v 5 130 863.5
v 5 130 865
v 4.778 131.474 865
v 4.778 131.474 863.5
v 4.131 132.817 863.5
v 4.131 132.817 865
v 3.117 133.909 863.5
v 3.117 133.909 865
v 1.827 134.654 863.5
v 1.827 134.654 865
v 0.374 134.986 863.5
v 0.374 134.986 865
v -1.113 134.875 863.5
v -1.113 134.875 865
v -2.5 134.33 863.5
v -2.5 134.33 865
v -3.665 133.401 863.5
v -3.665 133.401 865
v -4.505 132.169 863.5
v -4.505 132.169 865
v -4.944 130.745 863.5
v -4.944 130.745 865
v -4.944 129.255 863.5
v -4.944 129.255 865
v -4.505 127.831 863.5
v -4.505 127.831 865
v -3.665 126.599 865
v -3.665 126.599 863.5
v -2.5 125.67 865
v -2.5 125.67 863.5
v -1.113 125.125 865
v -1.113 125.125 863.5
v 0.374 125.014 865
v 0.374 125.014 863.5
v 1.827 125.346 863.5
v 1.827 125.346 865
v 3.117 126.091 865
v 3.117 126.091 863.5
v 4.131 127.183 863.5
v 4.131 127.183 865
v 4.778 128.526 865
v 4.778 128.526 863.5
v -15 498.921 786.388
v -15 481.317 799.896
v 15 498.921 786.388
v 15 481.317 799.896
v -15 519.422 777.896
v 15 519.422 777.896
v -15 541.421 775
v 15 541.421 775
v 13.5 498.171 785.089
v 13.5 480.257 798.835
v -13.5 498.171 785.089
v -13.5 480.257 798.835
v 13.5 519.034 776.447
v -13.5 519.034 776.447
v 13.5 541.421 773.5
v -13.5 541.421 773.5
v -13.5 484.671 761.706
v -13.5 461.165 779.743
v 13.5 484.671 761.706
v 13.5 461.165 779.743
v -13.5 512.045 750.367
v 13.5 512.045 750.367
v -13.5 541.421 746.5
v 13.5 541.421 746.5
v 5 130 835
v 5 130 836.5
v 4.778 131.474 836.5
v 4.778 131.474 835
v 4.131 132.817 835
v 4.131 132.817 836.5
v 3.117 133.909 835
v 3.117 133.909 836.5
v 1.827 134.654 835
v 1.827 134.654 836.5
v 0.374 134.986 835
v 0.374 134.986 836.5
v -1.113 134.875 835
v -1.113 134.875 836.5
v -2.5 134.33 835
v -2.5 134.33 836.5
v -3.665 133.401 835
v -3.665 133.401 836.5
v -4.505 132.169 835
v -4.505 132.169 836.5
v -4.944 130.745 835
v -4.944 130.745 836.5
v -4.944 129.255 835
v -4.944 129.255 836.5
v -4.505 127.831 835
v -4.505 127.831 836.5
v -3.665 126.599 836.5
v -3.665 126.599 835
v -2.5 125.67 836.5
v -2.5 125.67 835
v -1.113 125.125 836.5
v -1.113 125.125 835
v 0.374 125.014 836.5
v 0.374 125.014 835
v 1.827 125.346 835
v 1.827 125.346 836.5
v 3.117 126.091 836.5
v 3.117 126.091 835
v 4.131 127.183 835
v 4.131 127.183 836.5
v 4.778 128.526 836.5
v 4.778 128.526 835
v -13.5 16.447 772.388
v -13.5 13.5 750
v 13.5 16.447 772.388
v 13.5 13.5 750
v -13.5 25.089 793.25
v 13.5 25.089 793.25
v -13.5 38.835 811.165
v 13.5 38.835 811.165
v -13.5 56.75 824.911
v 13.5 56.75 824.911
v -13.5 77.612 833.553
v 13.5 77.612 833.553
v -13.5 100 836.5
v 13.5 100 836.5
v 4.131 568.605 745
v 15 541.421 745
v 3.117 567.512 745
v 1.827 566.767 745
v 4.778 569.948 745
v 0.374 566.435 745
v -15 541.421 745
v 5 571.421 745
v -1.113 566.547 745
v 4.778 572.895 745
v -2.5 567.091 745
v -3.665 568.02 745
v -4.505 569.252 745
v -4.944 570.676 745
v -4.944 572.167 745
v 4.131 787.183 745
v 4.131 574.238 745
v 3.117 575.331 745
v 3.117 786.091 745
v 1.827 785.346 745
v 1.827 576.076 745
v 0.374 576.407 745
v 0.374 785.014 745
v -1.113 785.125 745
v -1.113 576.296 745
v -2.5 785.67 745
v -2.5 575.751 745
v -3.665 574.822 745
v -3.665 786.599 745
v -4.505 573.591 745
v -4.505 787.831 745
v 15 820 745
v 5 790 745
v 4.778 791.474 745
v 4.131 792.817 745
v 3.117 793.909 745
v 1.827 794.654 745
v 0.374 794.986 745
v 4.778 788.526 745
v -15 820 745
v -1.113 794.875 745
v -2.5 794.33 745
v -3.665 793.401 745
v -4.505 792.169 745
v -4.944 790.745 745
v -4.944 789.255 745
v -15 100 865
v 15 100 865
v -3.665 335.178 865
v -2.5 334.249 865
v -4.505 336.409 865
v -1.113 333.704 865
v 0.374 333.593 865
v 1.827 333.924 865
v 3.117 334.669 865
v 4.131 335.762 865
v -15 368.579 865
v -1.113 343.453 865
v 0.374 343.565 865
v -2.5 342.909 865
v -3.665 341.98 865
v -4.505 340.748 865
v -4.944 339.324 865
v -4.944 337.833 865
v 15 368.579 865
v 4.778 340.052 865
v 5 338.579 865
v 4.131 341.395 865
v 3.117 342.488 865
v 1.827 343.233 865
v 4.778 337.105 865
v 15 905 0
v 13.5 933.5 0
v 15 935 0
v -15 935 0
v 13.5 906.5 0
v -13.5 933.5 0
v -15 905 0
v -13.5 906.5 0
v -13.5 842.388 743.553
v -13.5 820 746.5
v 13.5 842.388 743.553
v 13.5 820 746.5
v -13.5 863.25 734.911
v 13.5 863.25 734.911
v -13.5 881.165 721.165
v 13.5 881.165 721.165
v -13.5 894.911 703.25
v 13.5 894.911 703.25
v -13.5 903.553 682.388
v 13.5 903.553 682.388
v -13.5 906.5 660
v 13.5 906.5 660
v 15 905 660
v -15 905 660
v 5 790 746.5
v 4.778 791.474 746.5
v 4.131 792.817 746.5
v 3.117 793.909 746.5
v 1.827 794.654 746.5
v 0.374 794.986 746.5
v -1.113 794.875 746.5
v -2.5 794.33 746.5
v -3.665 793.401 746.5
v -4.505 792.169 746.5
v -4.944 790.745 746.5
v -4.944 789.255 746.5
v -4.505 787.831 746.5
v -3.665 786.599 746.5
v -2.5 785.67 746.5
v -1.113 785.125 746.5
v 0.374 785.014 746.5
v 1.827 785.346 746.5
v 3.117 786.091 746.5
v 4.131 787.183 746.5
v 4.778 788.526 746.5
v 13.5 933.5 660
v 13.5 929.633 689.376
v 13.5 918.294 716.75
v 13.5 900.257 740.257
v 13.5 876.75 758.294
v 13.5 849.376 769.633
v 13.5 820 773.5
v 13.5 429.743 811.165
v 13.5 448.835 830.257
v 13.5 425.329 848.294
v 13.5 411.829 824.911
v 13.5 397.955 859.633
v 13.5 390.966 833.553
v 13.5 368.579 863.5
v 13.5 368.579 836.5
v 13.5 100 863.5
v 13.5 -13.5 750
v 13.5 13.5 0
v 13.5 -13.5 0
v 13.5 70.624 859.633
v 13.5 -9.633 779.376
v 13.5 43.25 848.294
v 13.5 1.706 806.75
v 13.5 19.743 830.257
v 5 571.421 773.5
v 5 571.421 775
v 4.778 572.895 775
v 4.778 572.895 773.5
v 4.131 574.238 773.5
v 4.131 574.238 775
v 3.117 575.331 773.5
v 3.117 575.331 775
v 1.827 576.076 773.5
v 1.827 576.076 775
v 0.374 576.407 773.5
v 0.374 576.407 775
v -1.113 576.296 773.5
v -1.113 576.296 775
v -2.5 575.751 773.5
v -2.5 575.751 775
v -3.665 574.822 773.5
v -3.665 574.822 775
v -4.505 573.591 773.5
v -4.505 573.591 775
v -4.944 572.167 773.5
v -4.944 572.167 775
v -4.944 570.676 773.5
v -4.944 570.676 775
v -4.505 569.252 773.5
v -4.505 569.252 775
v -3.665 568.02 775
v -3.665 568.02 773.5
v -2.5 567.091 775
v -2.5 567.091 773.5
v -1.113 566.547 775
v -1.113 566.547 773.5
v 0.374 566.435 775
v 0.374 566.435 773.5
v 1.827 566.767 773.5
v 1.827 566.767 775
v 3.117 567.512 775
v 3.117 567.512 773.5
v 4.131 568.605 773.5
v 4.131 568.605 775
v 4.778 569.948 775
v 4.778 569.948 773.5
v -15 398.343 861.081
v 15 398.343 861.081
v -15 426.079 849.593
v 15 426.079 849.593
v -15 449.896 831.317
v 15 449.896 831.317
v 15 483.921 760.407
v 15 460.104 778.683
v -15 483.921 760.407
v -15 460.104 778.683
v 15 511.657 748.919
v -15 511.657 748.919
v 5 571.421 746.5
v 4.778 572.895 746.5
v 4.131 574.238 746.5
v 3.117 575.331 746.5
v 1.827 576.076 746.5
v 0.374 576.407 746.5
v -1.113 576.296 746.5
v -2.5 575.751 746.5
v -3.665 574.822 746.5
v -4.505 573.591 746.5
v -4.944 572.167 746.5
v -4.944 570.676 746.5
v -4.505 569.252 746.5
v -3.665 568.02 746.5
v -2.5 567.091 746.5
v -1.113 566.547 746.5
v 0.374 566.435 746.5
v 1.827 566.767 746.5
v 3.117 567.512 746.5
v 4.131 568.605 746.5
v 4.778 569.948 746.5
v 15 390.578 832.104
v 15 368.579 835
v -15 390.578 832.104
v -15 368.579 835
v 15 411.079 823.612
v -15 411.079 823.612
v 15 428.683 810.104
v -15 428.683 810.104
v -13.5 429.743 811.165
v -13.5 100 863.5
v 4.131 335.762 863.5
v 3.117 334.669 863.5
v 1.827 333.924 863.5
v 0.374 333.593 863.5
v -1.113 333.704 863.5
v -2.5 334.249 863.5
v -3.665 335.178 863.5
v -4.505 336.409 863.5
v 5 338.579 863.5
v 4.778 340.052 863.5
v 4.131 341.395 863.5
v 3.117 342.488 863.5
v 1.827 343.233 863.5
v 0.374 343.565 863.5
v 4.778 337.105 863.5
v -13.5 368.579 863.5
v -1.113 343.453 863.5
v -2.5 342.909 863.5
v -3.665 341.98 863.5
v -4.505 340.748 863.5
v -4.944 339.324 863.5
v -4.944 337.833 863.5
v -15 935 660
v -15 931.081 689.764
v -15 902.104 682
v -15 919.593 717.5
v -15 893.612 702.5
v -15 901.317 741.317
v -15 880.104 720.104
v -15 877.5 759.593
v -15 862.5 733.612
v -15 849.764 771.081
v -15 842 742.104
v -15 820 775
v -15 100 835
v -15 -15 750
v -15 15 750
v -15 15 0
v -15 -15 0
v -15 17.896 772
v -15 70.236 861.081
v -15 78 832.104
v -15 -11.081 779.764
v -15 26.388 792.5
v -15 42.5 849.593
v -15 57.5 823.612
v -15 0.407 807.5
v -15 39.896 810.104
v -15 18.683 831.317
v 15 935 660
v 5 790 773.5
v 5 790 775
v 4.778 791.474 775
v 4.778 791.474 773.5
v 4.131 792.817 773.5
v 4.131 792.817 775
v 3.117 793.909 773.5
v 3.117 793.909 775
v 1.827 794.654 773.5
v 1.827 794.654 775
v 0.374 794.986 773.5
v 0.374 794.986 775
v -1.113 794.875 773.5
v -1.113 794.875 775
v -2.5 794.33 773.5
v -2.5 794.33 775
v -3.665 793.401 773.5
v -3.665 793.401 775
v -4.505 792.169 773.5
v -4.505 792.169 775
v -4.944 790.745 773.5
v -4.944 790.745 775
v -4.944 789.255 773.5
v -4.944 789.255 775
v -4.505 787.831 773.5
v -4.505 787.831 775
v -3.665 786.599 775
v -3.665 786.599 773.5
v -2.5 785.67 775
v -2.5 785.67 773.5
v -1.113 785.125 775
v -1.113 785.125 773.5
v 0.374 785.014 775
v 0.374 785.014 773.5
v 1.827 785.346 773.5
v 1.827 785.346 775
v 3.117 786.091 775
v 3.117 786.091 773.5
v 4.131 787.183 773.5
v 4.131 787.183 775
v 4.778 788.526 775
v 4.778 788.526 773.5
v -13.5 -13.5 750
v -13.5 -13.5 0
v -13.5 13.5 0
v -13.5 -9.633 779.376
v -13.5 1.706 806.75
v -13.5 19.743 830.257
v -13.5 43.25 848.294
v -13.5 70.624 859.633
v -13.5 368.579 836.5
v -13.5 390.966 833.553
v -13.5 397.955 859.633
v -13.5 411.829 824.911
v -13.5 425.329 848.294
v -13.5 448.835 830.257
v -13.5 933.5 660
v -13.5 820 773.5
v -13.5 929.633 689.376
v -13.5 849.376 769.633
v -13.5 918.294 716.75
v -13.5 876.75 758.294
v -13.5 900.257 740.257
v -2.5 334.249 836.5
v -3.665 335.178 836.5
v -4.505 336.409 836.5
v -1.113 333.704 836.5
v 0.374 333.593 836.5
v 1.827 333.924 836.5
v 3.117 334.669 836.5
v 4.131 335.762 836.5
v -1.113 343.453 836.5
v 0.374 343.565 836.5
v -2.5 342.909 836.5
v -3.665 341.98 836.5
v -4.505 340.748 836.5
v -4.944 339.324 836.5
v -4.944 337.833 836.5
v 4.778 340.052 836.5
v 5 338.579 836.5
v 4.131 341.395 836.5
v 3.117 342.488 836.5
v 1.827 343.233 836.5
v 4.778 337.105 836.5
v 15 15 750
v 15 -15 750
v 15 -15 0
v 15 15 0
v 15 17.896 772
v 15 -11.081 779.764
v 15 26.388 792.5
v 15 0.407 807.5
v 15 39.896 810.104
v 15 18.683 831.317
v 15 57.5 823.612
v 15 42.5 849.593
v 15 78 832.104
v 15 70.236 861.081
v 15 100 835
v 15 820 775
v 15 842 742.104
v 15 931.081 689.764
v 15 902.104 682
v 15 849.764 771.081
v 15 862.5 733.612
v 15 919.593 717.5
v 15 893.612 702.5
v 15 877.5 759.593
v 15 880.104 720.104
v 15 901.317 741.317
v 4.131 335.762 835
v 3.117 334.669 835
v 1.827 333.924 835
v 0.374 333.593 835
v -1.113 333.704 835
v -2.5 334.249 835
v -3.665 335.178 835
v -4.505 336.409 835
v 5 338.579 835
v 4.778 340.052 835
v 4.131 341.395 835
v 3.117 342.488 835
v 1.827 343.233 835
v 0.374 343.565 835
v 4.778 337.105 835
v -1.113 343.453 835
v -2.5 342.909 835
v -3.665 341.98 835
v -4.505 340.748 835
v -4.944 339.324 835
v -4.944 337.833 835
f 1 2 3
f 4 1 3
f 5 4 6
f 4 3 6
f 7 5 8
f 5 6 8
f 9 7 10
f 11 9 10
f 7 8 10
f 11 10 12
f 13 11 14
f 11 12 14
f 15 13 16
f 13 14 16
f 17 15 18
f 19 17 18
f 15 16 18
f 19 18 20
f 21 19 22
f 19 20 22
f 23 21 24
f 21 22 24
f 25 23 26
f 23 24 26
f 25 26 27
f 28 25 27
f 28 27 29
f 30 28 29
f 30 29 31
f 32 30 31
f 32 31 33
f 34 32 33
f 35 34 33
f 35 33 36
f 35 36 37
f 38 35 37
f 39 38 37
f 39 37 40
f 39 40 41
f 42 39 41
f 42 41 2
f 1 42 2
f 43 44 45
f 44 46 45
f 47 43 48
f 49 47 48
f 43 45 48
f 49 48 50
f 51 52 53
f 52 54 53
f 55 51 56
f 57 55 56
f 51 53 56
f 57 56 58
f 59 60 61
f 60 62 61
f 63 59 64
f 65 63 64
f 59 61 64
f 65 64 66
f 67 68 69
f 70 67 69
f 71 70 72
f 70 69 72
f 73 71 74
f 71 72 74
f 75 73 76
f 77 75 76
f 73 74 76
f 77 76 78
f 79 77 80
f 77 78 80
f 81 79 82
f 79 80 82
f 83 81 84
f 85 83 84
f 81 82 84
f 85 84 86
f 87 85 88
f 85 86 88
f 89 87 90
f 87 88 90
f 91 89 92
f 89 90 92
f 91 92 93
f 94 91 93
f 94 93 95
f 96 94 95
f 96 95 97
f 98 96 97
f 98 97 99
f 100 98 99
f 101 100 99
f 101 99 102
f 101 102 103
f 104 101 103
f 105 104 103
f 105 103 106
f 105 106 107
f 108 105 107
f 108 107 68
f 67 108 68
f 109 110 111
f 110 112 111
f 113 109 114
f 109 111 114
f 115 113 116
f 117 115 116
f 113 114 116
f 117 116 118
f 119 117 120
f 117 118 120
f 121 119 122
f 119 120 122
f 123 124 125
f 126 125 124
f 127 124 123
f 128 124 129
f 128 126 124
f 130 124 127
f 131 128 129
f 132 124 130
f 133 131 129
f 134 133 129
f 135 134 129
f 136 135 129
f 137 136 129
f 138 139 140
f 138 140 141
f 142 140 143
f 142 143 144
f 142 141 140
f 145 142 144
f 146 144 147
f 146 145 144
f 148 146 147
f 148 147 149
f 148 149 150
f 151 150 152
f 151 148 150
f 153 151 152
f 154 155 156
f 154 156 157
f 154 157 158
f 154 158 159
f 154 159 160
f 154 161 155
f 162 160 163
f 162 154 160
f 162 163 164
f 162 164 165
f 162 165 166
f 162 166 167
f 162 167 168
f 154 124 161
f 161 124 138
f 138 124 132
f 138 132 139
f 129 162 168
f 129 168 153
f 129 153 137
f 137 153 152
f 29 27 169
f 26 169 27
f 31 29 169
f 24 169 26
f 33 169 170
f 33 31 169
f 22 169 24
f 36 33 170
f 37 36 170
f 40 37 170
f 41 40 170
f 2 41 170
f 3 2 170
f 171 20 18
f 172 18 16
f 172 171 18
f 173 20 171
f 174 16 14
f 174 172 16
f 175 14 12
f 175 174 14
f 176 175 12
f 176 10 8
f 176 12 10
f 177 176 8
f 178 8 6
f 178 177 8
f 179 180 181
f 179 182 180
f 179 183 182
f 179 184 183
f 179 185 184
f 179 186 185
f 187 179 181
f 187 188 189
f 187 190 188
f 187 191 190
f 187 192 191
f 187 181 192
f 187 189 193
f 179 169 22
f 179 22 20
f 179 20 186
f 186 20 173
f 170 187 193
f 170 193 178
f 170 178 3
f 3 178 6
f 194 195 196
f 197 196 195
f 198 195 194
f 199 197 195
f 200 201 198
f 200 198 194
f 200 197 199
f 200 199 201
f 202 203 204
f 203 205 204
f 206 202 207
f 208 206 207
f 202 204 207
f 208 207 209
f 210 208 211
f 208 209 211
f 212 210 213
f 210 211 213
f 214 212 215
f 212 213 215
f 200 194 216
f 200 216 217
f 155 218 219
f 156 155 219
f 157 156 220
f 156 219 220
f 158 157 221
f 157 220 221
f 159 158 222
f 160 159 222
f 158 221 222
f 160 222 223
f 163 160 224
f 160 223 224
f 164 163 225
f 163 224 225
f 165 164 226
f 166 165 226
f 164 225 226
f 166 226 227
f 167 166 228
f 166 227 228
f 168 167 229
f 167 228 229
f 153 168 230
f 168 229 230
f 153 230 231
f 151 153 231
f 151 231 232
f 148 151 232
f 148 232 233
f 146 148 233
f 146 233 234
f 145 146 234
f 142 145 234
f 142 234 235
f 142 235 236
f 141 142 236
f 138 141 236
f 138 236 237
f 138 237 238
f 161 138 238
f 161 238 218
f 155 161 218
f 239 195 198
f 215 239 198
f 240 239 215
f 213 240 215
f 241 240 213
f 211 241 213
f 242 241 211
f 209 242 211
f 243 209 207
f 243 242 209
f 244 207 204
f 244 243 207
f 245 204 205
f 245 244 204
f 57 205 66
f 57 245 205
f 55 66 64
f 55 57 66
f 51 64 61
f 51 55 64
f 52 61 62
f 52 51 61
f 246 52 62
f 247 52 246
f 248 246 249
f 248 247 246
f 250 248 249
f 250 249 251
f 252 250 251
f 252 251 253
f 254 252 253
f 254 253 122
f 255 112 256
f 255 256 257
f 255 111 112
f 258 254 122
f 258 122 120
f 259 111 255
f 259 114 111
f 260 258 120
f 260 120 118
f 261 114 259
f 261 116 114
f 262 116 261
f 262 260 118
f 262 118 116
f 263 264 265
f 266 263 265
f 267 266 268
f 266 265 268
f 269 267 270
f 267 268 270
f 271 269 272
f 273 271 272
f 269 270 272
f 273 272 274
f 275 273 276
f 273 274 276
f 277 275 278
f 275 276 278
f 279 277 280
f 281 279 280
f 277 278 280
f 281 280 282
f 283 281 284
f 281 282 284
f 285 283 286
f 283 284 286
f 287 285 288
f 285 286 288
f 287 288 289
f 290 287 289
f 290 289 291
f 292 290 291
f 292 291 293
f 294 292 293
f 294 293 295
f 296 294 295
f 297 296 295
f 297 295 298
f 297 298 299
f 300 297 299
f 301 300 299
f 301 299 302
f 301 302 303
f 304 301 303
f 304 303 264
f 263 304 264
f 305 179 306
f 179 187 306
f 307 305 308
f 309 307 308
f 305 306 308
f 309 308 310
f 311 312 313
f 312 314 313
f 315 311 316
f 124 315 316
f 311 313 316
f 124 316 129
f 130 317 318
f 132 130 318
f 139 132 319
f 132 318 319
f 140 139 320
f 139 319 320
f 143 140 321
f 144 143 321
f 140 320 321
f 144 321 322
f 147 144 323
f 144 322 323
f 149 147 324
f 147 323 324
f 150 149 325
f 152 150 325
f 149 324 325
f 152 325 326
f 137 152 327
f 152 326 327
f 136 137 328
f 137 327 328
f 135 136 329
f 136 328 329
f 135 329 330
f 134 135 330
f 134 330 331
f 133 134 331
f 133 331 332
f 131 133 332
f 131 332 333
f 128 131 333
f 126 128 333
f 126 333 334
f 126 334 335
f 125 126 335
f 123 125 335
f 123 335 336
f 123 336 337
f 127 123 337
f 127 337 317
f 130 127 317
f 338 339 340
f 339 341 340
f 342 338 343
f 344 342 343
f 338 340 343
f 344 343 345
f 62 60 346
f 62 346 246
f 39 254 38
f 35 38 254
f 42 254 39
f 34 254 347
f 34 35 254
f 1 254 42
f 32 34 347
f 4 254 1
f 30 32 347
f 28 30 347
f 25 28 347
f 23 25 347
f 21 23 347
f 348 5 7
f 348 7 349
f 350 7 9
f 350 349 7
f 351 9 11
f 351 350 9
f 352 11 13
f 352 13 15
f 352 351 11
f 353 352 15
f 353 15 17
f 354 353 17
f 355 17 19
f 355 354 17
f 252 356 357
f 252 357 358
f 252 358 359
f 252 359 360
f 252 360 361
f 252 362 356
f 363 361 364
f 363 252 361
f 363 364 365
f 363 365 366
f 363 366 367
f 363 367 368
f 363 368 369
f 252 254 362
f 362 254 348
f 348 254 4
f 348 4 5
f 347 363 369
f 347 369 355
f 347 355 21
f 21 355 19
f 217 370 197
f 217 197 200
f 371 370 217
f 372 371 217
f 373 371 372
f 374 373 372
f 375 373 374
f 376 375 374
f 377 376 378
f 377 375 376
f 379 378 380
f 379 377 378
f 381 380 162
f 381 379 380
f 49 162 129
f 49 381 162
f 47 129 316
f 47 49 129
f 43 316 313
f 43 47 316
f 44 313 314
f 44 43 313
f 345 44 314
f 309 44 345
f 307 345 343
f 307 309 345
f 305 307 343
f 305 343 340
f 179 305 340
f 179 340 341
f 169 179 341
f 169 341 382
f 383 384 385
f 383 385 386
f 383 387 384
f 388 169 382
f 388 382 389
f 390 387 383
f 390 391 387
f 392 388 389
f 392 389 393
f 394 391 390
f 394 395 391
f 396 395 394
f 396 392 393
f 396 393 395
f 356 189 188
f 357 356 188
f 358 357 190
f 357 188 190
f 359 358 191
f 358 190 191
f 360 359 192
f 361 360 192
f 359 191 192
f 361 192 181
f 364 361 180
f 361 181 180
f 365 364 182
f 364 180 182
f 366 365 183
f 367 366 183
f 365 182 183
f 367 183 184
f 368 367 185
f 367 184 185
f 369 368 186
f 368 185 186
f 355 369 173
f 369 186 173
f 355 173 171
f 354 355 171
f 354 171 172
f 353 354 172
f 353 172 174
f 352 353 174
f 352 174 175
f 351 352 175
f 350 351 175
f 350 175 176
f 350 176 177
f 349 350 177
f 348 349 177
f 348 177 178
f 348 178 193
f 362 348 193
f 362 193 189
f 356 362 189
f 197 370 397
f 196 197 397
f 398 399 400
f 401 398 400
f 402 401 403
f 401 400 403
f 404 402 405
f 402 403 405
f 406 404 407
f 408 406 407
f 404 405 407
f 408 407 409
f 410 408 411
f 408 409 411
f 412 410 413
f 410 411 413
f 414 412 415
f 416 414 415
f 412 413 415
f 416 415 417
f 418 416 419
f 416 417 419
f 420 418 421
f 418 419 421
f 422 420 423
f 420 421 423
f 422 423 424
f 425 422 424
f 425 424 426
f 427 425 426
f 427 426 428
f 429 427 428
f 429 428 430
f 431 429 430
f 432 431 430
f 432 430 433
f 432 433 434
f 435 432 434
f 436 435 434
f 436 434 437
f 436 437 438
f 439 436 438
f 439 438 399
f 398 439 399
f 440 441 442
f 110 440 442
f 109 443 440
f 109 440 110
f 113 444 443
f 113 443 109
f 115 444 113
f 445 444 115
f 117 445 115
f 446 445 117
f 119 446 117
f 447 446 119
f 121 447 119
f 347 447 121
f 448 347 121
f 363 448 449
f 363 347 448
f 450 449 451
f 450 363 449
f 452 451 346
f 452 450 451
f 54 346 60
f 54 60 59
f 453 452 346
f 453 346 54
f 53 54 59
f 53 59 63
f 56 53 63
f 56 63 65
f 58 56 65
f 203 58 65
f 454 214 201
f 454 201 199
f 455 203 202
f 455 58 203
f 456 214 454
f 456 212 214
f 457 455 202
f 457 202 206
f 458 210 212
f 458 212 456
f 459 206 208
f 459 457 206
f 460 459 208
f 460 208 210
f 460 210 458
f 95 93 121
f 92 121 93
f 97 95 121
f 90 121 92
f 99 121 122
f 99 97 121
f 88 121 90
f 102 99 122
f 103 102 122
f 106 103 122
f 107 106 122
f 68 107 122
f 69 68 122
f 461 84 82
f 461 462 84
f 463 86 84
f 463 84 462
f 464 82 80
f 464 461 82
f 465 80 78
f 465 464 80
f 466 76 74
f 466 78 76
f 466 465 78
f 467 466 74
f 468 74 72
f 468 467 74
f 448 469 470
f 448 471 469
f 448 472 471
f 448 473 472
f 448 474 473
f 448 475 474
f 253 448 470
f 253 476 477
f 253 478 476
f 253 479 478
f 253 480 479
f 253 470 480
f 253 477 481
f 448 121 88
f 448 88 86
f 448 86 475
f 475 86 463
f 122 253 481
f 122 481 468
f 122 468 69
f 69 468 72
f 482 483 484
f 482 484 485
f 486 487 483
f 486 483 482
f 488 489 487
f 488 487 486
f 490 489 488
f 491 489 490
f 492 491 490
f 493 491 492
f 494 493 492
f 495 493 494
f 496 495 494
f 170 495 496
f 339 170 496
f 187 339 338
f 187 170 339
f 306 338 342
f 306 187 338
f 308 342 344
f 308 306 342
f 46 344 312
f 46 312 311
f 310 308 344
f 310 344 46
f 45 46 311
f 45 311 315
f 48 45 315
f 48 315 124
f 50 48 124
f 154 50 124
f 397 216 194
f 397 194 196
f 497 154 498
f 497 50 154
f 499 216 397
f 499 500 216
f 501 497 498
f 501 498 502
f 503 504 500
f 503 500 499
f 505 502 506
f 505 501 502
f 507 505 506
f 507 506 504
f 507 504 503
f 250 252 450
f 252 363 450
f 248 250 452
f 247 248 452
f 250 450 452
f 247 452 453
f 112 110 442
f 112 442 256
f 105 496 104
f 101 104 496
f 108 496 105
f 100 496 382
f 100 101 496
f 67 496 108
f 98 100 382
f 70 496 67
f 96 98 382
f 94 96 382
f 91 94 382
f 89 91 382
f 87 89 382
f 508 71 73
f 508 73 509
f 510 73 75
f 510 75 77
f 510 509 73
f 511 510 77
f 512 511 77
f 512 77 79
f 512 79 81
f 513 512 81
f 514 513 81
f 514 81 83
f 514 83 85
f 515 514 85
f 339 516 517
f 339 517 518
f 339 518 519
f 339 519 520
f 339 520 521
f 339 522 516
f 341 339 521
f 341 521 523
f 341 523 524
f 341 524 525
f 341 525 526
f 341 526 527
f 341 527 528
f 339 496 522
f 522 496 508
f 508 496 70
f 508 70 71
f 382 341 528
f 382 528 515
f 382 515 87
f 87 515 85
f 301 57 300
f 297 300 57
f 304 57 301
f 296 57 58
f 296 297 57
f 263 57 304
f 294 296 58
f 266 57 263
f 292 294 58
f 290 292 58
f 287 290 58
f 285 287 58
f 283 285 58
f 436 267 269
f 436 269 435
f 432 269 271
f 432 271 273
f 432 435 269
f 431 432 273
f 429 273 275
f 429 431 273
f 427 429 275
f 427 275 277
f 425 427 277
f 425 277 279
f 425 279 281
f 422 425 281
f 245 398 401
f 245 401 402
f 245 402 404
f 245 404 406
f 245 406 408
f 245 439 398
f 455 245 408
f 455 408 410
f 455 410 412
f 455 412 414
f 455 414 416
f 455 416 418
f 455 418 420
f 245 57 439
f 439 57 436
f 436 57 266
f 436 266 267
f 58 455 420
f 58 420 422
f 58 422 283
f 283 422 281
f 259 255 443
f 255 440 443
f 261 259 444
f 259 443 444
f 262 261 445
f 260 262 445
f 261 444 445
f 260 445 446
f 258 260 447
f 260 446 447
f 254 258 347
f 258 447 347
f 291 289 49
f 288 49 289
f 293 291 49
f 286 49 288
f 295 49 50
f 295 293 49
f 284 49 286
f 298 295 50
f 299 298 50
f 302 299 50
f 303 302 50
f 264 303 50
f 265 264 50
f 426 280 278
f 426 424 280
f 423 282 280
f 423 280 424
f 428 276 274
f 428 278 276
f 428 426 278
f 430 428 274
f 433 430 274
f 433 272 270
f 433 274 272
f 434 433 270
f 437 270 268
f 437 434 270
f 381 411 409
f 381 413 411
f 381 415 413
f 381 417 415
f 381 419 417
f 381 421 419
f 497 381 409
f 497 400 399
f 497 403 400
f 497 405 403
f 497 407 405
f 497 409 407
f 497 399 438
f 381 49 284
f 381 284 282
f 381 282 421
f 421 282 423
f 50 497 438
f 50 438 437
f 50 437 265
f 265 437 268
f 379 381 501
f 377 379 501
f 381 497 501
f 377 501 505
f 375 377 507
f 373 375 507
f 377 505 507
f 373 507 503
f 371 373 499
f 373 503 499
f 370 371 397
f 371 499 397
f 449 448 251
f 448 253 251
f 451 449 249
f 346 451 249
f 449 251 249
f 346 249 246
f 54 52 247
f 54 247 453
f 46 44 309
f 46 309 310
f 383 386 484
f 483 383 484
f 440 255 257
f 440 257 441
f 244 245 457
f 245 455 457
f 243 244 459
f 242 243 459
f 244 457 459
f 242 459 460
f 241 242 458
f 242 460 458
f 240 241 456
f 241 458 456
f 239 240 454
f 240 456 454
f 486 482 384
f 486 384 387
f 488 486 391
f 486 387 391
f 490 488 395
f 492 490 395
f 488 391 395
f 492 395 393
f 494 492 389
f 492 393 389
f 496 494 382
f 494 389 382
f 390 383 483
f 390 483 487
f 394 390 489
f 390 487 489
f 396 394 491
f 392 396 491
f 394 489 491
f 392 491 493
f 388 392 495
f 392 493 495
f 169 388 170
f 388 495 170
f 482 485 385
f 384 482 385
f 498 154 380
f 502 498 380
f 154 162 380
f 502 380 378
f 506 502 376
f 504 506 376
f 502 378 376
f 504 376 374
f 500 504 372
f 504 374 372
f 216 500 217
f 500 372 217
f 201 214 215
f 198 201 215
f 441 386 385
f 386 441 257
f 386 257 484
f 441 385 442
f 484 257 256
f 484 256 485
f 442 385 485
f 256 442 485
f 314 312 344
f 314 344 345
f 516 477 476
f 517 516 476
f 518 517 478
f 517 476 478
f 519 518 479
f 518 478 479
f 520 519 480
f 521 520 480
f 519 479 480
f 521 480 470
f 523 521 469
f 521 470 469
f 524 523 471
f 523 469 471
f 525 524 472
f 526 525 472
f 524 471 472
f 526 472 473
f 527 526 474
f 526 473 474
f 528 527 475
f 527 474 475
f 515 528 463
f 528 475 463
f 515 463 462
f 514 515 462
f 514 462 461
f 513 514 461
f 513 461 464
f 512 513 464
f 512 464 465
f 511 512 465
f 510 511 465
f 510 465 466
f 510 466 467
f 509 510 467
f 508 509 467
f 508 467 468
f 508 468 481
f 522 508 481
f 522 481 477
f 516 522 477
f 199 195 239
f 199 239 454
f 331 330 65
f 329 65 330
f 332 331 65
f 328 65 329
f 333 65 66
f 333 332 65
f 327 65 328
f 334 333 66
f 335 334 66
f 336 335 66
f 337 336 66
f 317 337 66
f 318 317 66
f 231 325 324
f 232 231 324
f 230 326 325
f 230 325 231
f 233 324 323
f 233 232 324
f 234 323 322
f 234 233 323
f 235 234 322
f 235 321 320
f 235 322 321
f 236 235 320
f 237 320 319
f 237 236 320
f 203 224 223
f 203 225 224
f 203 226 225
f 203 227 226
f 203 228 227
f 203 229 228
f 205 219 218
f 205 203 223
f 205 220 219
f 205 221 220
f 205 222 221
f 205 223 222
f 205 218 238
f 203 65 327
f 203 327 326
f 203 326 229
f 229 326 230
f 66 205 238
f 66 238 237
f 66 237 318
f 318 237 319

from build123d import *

# Parameters (mm, degrees)
F1_W     = 30
F1_H     = 30
F1_W_2   = 27
F1_H_2   = 27
F3_R     = 5
F5_DEPTH = 40
F4_R     = 5
F6_DEPTH = 40


with BuildPart() as f2:
    # F2: sweep along a path in F0
    with BuildLine(Plane.YZ) as f2_path:
        Line((0, 0), (0, 750))
        ThreePointArc((0, 750), (29.2893218813, 820.7106781187), (100, 850))
        Line((100, 850), (368.5786437627, 850))
        ThreePointArc((368.5786437627, 850), (406.8469869992, 842.3879532511), (439.2893218813, 820.7106781187))
        Line((439.2893218813, 820.7106781187), (470.7106781187, 789.2893218813))
        ThreePointArc((470.7106781187, 789.2893218813), (503.1530130008, 767.6120467489), (541.4213562373, 760))
        Line((541.4213562373, 760), (820, 760))
        ThreePointArc((820, 760), (890.7106781187, 730.7106781187), (920, 660))
        Line((920, 660), (920, 0))
    # F1 (on Top) → F2 (sweep)
    with BuildSketch(Plane.XY):
        Rectangle(F1_W, F1_H)
        Rectangle(F1_W_2, F1_H_2, mode=Mode.SUBTRACT)
    sweep(path=f2_path.line)

    # F3 (on face) → F5 (cut)
    with BuildSketch(Plane.XY.offset(865)):
        with Locations((0, 130)):
            Circle(F3_R)
        with Locations((0, 338.5786437627)):
            Circle(F3_R)
    extrude(amount=-F5_DEPTH, mode=Mode.SUBTRACT)

    # F4 (on face) → F6 (cut)
    with BuildSketch(Plane.XY.offset(775)):
        with Locations((0, 571.4213562373)):
            Circle(F4_R)
        with Locations((0, 790)):
            Circle(F4_R)
    extrude(amount=-F6_DEPTH, mode=Mode.SUBTRACT)


solid = f2.part
